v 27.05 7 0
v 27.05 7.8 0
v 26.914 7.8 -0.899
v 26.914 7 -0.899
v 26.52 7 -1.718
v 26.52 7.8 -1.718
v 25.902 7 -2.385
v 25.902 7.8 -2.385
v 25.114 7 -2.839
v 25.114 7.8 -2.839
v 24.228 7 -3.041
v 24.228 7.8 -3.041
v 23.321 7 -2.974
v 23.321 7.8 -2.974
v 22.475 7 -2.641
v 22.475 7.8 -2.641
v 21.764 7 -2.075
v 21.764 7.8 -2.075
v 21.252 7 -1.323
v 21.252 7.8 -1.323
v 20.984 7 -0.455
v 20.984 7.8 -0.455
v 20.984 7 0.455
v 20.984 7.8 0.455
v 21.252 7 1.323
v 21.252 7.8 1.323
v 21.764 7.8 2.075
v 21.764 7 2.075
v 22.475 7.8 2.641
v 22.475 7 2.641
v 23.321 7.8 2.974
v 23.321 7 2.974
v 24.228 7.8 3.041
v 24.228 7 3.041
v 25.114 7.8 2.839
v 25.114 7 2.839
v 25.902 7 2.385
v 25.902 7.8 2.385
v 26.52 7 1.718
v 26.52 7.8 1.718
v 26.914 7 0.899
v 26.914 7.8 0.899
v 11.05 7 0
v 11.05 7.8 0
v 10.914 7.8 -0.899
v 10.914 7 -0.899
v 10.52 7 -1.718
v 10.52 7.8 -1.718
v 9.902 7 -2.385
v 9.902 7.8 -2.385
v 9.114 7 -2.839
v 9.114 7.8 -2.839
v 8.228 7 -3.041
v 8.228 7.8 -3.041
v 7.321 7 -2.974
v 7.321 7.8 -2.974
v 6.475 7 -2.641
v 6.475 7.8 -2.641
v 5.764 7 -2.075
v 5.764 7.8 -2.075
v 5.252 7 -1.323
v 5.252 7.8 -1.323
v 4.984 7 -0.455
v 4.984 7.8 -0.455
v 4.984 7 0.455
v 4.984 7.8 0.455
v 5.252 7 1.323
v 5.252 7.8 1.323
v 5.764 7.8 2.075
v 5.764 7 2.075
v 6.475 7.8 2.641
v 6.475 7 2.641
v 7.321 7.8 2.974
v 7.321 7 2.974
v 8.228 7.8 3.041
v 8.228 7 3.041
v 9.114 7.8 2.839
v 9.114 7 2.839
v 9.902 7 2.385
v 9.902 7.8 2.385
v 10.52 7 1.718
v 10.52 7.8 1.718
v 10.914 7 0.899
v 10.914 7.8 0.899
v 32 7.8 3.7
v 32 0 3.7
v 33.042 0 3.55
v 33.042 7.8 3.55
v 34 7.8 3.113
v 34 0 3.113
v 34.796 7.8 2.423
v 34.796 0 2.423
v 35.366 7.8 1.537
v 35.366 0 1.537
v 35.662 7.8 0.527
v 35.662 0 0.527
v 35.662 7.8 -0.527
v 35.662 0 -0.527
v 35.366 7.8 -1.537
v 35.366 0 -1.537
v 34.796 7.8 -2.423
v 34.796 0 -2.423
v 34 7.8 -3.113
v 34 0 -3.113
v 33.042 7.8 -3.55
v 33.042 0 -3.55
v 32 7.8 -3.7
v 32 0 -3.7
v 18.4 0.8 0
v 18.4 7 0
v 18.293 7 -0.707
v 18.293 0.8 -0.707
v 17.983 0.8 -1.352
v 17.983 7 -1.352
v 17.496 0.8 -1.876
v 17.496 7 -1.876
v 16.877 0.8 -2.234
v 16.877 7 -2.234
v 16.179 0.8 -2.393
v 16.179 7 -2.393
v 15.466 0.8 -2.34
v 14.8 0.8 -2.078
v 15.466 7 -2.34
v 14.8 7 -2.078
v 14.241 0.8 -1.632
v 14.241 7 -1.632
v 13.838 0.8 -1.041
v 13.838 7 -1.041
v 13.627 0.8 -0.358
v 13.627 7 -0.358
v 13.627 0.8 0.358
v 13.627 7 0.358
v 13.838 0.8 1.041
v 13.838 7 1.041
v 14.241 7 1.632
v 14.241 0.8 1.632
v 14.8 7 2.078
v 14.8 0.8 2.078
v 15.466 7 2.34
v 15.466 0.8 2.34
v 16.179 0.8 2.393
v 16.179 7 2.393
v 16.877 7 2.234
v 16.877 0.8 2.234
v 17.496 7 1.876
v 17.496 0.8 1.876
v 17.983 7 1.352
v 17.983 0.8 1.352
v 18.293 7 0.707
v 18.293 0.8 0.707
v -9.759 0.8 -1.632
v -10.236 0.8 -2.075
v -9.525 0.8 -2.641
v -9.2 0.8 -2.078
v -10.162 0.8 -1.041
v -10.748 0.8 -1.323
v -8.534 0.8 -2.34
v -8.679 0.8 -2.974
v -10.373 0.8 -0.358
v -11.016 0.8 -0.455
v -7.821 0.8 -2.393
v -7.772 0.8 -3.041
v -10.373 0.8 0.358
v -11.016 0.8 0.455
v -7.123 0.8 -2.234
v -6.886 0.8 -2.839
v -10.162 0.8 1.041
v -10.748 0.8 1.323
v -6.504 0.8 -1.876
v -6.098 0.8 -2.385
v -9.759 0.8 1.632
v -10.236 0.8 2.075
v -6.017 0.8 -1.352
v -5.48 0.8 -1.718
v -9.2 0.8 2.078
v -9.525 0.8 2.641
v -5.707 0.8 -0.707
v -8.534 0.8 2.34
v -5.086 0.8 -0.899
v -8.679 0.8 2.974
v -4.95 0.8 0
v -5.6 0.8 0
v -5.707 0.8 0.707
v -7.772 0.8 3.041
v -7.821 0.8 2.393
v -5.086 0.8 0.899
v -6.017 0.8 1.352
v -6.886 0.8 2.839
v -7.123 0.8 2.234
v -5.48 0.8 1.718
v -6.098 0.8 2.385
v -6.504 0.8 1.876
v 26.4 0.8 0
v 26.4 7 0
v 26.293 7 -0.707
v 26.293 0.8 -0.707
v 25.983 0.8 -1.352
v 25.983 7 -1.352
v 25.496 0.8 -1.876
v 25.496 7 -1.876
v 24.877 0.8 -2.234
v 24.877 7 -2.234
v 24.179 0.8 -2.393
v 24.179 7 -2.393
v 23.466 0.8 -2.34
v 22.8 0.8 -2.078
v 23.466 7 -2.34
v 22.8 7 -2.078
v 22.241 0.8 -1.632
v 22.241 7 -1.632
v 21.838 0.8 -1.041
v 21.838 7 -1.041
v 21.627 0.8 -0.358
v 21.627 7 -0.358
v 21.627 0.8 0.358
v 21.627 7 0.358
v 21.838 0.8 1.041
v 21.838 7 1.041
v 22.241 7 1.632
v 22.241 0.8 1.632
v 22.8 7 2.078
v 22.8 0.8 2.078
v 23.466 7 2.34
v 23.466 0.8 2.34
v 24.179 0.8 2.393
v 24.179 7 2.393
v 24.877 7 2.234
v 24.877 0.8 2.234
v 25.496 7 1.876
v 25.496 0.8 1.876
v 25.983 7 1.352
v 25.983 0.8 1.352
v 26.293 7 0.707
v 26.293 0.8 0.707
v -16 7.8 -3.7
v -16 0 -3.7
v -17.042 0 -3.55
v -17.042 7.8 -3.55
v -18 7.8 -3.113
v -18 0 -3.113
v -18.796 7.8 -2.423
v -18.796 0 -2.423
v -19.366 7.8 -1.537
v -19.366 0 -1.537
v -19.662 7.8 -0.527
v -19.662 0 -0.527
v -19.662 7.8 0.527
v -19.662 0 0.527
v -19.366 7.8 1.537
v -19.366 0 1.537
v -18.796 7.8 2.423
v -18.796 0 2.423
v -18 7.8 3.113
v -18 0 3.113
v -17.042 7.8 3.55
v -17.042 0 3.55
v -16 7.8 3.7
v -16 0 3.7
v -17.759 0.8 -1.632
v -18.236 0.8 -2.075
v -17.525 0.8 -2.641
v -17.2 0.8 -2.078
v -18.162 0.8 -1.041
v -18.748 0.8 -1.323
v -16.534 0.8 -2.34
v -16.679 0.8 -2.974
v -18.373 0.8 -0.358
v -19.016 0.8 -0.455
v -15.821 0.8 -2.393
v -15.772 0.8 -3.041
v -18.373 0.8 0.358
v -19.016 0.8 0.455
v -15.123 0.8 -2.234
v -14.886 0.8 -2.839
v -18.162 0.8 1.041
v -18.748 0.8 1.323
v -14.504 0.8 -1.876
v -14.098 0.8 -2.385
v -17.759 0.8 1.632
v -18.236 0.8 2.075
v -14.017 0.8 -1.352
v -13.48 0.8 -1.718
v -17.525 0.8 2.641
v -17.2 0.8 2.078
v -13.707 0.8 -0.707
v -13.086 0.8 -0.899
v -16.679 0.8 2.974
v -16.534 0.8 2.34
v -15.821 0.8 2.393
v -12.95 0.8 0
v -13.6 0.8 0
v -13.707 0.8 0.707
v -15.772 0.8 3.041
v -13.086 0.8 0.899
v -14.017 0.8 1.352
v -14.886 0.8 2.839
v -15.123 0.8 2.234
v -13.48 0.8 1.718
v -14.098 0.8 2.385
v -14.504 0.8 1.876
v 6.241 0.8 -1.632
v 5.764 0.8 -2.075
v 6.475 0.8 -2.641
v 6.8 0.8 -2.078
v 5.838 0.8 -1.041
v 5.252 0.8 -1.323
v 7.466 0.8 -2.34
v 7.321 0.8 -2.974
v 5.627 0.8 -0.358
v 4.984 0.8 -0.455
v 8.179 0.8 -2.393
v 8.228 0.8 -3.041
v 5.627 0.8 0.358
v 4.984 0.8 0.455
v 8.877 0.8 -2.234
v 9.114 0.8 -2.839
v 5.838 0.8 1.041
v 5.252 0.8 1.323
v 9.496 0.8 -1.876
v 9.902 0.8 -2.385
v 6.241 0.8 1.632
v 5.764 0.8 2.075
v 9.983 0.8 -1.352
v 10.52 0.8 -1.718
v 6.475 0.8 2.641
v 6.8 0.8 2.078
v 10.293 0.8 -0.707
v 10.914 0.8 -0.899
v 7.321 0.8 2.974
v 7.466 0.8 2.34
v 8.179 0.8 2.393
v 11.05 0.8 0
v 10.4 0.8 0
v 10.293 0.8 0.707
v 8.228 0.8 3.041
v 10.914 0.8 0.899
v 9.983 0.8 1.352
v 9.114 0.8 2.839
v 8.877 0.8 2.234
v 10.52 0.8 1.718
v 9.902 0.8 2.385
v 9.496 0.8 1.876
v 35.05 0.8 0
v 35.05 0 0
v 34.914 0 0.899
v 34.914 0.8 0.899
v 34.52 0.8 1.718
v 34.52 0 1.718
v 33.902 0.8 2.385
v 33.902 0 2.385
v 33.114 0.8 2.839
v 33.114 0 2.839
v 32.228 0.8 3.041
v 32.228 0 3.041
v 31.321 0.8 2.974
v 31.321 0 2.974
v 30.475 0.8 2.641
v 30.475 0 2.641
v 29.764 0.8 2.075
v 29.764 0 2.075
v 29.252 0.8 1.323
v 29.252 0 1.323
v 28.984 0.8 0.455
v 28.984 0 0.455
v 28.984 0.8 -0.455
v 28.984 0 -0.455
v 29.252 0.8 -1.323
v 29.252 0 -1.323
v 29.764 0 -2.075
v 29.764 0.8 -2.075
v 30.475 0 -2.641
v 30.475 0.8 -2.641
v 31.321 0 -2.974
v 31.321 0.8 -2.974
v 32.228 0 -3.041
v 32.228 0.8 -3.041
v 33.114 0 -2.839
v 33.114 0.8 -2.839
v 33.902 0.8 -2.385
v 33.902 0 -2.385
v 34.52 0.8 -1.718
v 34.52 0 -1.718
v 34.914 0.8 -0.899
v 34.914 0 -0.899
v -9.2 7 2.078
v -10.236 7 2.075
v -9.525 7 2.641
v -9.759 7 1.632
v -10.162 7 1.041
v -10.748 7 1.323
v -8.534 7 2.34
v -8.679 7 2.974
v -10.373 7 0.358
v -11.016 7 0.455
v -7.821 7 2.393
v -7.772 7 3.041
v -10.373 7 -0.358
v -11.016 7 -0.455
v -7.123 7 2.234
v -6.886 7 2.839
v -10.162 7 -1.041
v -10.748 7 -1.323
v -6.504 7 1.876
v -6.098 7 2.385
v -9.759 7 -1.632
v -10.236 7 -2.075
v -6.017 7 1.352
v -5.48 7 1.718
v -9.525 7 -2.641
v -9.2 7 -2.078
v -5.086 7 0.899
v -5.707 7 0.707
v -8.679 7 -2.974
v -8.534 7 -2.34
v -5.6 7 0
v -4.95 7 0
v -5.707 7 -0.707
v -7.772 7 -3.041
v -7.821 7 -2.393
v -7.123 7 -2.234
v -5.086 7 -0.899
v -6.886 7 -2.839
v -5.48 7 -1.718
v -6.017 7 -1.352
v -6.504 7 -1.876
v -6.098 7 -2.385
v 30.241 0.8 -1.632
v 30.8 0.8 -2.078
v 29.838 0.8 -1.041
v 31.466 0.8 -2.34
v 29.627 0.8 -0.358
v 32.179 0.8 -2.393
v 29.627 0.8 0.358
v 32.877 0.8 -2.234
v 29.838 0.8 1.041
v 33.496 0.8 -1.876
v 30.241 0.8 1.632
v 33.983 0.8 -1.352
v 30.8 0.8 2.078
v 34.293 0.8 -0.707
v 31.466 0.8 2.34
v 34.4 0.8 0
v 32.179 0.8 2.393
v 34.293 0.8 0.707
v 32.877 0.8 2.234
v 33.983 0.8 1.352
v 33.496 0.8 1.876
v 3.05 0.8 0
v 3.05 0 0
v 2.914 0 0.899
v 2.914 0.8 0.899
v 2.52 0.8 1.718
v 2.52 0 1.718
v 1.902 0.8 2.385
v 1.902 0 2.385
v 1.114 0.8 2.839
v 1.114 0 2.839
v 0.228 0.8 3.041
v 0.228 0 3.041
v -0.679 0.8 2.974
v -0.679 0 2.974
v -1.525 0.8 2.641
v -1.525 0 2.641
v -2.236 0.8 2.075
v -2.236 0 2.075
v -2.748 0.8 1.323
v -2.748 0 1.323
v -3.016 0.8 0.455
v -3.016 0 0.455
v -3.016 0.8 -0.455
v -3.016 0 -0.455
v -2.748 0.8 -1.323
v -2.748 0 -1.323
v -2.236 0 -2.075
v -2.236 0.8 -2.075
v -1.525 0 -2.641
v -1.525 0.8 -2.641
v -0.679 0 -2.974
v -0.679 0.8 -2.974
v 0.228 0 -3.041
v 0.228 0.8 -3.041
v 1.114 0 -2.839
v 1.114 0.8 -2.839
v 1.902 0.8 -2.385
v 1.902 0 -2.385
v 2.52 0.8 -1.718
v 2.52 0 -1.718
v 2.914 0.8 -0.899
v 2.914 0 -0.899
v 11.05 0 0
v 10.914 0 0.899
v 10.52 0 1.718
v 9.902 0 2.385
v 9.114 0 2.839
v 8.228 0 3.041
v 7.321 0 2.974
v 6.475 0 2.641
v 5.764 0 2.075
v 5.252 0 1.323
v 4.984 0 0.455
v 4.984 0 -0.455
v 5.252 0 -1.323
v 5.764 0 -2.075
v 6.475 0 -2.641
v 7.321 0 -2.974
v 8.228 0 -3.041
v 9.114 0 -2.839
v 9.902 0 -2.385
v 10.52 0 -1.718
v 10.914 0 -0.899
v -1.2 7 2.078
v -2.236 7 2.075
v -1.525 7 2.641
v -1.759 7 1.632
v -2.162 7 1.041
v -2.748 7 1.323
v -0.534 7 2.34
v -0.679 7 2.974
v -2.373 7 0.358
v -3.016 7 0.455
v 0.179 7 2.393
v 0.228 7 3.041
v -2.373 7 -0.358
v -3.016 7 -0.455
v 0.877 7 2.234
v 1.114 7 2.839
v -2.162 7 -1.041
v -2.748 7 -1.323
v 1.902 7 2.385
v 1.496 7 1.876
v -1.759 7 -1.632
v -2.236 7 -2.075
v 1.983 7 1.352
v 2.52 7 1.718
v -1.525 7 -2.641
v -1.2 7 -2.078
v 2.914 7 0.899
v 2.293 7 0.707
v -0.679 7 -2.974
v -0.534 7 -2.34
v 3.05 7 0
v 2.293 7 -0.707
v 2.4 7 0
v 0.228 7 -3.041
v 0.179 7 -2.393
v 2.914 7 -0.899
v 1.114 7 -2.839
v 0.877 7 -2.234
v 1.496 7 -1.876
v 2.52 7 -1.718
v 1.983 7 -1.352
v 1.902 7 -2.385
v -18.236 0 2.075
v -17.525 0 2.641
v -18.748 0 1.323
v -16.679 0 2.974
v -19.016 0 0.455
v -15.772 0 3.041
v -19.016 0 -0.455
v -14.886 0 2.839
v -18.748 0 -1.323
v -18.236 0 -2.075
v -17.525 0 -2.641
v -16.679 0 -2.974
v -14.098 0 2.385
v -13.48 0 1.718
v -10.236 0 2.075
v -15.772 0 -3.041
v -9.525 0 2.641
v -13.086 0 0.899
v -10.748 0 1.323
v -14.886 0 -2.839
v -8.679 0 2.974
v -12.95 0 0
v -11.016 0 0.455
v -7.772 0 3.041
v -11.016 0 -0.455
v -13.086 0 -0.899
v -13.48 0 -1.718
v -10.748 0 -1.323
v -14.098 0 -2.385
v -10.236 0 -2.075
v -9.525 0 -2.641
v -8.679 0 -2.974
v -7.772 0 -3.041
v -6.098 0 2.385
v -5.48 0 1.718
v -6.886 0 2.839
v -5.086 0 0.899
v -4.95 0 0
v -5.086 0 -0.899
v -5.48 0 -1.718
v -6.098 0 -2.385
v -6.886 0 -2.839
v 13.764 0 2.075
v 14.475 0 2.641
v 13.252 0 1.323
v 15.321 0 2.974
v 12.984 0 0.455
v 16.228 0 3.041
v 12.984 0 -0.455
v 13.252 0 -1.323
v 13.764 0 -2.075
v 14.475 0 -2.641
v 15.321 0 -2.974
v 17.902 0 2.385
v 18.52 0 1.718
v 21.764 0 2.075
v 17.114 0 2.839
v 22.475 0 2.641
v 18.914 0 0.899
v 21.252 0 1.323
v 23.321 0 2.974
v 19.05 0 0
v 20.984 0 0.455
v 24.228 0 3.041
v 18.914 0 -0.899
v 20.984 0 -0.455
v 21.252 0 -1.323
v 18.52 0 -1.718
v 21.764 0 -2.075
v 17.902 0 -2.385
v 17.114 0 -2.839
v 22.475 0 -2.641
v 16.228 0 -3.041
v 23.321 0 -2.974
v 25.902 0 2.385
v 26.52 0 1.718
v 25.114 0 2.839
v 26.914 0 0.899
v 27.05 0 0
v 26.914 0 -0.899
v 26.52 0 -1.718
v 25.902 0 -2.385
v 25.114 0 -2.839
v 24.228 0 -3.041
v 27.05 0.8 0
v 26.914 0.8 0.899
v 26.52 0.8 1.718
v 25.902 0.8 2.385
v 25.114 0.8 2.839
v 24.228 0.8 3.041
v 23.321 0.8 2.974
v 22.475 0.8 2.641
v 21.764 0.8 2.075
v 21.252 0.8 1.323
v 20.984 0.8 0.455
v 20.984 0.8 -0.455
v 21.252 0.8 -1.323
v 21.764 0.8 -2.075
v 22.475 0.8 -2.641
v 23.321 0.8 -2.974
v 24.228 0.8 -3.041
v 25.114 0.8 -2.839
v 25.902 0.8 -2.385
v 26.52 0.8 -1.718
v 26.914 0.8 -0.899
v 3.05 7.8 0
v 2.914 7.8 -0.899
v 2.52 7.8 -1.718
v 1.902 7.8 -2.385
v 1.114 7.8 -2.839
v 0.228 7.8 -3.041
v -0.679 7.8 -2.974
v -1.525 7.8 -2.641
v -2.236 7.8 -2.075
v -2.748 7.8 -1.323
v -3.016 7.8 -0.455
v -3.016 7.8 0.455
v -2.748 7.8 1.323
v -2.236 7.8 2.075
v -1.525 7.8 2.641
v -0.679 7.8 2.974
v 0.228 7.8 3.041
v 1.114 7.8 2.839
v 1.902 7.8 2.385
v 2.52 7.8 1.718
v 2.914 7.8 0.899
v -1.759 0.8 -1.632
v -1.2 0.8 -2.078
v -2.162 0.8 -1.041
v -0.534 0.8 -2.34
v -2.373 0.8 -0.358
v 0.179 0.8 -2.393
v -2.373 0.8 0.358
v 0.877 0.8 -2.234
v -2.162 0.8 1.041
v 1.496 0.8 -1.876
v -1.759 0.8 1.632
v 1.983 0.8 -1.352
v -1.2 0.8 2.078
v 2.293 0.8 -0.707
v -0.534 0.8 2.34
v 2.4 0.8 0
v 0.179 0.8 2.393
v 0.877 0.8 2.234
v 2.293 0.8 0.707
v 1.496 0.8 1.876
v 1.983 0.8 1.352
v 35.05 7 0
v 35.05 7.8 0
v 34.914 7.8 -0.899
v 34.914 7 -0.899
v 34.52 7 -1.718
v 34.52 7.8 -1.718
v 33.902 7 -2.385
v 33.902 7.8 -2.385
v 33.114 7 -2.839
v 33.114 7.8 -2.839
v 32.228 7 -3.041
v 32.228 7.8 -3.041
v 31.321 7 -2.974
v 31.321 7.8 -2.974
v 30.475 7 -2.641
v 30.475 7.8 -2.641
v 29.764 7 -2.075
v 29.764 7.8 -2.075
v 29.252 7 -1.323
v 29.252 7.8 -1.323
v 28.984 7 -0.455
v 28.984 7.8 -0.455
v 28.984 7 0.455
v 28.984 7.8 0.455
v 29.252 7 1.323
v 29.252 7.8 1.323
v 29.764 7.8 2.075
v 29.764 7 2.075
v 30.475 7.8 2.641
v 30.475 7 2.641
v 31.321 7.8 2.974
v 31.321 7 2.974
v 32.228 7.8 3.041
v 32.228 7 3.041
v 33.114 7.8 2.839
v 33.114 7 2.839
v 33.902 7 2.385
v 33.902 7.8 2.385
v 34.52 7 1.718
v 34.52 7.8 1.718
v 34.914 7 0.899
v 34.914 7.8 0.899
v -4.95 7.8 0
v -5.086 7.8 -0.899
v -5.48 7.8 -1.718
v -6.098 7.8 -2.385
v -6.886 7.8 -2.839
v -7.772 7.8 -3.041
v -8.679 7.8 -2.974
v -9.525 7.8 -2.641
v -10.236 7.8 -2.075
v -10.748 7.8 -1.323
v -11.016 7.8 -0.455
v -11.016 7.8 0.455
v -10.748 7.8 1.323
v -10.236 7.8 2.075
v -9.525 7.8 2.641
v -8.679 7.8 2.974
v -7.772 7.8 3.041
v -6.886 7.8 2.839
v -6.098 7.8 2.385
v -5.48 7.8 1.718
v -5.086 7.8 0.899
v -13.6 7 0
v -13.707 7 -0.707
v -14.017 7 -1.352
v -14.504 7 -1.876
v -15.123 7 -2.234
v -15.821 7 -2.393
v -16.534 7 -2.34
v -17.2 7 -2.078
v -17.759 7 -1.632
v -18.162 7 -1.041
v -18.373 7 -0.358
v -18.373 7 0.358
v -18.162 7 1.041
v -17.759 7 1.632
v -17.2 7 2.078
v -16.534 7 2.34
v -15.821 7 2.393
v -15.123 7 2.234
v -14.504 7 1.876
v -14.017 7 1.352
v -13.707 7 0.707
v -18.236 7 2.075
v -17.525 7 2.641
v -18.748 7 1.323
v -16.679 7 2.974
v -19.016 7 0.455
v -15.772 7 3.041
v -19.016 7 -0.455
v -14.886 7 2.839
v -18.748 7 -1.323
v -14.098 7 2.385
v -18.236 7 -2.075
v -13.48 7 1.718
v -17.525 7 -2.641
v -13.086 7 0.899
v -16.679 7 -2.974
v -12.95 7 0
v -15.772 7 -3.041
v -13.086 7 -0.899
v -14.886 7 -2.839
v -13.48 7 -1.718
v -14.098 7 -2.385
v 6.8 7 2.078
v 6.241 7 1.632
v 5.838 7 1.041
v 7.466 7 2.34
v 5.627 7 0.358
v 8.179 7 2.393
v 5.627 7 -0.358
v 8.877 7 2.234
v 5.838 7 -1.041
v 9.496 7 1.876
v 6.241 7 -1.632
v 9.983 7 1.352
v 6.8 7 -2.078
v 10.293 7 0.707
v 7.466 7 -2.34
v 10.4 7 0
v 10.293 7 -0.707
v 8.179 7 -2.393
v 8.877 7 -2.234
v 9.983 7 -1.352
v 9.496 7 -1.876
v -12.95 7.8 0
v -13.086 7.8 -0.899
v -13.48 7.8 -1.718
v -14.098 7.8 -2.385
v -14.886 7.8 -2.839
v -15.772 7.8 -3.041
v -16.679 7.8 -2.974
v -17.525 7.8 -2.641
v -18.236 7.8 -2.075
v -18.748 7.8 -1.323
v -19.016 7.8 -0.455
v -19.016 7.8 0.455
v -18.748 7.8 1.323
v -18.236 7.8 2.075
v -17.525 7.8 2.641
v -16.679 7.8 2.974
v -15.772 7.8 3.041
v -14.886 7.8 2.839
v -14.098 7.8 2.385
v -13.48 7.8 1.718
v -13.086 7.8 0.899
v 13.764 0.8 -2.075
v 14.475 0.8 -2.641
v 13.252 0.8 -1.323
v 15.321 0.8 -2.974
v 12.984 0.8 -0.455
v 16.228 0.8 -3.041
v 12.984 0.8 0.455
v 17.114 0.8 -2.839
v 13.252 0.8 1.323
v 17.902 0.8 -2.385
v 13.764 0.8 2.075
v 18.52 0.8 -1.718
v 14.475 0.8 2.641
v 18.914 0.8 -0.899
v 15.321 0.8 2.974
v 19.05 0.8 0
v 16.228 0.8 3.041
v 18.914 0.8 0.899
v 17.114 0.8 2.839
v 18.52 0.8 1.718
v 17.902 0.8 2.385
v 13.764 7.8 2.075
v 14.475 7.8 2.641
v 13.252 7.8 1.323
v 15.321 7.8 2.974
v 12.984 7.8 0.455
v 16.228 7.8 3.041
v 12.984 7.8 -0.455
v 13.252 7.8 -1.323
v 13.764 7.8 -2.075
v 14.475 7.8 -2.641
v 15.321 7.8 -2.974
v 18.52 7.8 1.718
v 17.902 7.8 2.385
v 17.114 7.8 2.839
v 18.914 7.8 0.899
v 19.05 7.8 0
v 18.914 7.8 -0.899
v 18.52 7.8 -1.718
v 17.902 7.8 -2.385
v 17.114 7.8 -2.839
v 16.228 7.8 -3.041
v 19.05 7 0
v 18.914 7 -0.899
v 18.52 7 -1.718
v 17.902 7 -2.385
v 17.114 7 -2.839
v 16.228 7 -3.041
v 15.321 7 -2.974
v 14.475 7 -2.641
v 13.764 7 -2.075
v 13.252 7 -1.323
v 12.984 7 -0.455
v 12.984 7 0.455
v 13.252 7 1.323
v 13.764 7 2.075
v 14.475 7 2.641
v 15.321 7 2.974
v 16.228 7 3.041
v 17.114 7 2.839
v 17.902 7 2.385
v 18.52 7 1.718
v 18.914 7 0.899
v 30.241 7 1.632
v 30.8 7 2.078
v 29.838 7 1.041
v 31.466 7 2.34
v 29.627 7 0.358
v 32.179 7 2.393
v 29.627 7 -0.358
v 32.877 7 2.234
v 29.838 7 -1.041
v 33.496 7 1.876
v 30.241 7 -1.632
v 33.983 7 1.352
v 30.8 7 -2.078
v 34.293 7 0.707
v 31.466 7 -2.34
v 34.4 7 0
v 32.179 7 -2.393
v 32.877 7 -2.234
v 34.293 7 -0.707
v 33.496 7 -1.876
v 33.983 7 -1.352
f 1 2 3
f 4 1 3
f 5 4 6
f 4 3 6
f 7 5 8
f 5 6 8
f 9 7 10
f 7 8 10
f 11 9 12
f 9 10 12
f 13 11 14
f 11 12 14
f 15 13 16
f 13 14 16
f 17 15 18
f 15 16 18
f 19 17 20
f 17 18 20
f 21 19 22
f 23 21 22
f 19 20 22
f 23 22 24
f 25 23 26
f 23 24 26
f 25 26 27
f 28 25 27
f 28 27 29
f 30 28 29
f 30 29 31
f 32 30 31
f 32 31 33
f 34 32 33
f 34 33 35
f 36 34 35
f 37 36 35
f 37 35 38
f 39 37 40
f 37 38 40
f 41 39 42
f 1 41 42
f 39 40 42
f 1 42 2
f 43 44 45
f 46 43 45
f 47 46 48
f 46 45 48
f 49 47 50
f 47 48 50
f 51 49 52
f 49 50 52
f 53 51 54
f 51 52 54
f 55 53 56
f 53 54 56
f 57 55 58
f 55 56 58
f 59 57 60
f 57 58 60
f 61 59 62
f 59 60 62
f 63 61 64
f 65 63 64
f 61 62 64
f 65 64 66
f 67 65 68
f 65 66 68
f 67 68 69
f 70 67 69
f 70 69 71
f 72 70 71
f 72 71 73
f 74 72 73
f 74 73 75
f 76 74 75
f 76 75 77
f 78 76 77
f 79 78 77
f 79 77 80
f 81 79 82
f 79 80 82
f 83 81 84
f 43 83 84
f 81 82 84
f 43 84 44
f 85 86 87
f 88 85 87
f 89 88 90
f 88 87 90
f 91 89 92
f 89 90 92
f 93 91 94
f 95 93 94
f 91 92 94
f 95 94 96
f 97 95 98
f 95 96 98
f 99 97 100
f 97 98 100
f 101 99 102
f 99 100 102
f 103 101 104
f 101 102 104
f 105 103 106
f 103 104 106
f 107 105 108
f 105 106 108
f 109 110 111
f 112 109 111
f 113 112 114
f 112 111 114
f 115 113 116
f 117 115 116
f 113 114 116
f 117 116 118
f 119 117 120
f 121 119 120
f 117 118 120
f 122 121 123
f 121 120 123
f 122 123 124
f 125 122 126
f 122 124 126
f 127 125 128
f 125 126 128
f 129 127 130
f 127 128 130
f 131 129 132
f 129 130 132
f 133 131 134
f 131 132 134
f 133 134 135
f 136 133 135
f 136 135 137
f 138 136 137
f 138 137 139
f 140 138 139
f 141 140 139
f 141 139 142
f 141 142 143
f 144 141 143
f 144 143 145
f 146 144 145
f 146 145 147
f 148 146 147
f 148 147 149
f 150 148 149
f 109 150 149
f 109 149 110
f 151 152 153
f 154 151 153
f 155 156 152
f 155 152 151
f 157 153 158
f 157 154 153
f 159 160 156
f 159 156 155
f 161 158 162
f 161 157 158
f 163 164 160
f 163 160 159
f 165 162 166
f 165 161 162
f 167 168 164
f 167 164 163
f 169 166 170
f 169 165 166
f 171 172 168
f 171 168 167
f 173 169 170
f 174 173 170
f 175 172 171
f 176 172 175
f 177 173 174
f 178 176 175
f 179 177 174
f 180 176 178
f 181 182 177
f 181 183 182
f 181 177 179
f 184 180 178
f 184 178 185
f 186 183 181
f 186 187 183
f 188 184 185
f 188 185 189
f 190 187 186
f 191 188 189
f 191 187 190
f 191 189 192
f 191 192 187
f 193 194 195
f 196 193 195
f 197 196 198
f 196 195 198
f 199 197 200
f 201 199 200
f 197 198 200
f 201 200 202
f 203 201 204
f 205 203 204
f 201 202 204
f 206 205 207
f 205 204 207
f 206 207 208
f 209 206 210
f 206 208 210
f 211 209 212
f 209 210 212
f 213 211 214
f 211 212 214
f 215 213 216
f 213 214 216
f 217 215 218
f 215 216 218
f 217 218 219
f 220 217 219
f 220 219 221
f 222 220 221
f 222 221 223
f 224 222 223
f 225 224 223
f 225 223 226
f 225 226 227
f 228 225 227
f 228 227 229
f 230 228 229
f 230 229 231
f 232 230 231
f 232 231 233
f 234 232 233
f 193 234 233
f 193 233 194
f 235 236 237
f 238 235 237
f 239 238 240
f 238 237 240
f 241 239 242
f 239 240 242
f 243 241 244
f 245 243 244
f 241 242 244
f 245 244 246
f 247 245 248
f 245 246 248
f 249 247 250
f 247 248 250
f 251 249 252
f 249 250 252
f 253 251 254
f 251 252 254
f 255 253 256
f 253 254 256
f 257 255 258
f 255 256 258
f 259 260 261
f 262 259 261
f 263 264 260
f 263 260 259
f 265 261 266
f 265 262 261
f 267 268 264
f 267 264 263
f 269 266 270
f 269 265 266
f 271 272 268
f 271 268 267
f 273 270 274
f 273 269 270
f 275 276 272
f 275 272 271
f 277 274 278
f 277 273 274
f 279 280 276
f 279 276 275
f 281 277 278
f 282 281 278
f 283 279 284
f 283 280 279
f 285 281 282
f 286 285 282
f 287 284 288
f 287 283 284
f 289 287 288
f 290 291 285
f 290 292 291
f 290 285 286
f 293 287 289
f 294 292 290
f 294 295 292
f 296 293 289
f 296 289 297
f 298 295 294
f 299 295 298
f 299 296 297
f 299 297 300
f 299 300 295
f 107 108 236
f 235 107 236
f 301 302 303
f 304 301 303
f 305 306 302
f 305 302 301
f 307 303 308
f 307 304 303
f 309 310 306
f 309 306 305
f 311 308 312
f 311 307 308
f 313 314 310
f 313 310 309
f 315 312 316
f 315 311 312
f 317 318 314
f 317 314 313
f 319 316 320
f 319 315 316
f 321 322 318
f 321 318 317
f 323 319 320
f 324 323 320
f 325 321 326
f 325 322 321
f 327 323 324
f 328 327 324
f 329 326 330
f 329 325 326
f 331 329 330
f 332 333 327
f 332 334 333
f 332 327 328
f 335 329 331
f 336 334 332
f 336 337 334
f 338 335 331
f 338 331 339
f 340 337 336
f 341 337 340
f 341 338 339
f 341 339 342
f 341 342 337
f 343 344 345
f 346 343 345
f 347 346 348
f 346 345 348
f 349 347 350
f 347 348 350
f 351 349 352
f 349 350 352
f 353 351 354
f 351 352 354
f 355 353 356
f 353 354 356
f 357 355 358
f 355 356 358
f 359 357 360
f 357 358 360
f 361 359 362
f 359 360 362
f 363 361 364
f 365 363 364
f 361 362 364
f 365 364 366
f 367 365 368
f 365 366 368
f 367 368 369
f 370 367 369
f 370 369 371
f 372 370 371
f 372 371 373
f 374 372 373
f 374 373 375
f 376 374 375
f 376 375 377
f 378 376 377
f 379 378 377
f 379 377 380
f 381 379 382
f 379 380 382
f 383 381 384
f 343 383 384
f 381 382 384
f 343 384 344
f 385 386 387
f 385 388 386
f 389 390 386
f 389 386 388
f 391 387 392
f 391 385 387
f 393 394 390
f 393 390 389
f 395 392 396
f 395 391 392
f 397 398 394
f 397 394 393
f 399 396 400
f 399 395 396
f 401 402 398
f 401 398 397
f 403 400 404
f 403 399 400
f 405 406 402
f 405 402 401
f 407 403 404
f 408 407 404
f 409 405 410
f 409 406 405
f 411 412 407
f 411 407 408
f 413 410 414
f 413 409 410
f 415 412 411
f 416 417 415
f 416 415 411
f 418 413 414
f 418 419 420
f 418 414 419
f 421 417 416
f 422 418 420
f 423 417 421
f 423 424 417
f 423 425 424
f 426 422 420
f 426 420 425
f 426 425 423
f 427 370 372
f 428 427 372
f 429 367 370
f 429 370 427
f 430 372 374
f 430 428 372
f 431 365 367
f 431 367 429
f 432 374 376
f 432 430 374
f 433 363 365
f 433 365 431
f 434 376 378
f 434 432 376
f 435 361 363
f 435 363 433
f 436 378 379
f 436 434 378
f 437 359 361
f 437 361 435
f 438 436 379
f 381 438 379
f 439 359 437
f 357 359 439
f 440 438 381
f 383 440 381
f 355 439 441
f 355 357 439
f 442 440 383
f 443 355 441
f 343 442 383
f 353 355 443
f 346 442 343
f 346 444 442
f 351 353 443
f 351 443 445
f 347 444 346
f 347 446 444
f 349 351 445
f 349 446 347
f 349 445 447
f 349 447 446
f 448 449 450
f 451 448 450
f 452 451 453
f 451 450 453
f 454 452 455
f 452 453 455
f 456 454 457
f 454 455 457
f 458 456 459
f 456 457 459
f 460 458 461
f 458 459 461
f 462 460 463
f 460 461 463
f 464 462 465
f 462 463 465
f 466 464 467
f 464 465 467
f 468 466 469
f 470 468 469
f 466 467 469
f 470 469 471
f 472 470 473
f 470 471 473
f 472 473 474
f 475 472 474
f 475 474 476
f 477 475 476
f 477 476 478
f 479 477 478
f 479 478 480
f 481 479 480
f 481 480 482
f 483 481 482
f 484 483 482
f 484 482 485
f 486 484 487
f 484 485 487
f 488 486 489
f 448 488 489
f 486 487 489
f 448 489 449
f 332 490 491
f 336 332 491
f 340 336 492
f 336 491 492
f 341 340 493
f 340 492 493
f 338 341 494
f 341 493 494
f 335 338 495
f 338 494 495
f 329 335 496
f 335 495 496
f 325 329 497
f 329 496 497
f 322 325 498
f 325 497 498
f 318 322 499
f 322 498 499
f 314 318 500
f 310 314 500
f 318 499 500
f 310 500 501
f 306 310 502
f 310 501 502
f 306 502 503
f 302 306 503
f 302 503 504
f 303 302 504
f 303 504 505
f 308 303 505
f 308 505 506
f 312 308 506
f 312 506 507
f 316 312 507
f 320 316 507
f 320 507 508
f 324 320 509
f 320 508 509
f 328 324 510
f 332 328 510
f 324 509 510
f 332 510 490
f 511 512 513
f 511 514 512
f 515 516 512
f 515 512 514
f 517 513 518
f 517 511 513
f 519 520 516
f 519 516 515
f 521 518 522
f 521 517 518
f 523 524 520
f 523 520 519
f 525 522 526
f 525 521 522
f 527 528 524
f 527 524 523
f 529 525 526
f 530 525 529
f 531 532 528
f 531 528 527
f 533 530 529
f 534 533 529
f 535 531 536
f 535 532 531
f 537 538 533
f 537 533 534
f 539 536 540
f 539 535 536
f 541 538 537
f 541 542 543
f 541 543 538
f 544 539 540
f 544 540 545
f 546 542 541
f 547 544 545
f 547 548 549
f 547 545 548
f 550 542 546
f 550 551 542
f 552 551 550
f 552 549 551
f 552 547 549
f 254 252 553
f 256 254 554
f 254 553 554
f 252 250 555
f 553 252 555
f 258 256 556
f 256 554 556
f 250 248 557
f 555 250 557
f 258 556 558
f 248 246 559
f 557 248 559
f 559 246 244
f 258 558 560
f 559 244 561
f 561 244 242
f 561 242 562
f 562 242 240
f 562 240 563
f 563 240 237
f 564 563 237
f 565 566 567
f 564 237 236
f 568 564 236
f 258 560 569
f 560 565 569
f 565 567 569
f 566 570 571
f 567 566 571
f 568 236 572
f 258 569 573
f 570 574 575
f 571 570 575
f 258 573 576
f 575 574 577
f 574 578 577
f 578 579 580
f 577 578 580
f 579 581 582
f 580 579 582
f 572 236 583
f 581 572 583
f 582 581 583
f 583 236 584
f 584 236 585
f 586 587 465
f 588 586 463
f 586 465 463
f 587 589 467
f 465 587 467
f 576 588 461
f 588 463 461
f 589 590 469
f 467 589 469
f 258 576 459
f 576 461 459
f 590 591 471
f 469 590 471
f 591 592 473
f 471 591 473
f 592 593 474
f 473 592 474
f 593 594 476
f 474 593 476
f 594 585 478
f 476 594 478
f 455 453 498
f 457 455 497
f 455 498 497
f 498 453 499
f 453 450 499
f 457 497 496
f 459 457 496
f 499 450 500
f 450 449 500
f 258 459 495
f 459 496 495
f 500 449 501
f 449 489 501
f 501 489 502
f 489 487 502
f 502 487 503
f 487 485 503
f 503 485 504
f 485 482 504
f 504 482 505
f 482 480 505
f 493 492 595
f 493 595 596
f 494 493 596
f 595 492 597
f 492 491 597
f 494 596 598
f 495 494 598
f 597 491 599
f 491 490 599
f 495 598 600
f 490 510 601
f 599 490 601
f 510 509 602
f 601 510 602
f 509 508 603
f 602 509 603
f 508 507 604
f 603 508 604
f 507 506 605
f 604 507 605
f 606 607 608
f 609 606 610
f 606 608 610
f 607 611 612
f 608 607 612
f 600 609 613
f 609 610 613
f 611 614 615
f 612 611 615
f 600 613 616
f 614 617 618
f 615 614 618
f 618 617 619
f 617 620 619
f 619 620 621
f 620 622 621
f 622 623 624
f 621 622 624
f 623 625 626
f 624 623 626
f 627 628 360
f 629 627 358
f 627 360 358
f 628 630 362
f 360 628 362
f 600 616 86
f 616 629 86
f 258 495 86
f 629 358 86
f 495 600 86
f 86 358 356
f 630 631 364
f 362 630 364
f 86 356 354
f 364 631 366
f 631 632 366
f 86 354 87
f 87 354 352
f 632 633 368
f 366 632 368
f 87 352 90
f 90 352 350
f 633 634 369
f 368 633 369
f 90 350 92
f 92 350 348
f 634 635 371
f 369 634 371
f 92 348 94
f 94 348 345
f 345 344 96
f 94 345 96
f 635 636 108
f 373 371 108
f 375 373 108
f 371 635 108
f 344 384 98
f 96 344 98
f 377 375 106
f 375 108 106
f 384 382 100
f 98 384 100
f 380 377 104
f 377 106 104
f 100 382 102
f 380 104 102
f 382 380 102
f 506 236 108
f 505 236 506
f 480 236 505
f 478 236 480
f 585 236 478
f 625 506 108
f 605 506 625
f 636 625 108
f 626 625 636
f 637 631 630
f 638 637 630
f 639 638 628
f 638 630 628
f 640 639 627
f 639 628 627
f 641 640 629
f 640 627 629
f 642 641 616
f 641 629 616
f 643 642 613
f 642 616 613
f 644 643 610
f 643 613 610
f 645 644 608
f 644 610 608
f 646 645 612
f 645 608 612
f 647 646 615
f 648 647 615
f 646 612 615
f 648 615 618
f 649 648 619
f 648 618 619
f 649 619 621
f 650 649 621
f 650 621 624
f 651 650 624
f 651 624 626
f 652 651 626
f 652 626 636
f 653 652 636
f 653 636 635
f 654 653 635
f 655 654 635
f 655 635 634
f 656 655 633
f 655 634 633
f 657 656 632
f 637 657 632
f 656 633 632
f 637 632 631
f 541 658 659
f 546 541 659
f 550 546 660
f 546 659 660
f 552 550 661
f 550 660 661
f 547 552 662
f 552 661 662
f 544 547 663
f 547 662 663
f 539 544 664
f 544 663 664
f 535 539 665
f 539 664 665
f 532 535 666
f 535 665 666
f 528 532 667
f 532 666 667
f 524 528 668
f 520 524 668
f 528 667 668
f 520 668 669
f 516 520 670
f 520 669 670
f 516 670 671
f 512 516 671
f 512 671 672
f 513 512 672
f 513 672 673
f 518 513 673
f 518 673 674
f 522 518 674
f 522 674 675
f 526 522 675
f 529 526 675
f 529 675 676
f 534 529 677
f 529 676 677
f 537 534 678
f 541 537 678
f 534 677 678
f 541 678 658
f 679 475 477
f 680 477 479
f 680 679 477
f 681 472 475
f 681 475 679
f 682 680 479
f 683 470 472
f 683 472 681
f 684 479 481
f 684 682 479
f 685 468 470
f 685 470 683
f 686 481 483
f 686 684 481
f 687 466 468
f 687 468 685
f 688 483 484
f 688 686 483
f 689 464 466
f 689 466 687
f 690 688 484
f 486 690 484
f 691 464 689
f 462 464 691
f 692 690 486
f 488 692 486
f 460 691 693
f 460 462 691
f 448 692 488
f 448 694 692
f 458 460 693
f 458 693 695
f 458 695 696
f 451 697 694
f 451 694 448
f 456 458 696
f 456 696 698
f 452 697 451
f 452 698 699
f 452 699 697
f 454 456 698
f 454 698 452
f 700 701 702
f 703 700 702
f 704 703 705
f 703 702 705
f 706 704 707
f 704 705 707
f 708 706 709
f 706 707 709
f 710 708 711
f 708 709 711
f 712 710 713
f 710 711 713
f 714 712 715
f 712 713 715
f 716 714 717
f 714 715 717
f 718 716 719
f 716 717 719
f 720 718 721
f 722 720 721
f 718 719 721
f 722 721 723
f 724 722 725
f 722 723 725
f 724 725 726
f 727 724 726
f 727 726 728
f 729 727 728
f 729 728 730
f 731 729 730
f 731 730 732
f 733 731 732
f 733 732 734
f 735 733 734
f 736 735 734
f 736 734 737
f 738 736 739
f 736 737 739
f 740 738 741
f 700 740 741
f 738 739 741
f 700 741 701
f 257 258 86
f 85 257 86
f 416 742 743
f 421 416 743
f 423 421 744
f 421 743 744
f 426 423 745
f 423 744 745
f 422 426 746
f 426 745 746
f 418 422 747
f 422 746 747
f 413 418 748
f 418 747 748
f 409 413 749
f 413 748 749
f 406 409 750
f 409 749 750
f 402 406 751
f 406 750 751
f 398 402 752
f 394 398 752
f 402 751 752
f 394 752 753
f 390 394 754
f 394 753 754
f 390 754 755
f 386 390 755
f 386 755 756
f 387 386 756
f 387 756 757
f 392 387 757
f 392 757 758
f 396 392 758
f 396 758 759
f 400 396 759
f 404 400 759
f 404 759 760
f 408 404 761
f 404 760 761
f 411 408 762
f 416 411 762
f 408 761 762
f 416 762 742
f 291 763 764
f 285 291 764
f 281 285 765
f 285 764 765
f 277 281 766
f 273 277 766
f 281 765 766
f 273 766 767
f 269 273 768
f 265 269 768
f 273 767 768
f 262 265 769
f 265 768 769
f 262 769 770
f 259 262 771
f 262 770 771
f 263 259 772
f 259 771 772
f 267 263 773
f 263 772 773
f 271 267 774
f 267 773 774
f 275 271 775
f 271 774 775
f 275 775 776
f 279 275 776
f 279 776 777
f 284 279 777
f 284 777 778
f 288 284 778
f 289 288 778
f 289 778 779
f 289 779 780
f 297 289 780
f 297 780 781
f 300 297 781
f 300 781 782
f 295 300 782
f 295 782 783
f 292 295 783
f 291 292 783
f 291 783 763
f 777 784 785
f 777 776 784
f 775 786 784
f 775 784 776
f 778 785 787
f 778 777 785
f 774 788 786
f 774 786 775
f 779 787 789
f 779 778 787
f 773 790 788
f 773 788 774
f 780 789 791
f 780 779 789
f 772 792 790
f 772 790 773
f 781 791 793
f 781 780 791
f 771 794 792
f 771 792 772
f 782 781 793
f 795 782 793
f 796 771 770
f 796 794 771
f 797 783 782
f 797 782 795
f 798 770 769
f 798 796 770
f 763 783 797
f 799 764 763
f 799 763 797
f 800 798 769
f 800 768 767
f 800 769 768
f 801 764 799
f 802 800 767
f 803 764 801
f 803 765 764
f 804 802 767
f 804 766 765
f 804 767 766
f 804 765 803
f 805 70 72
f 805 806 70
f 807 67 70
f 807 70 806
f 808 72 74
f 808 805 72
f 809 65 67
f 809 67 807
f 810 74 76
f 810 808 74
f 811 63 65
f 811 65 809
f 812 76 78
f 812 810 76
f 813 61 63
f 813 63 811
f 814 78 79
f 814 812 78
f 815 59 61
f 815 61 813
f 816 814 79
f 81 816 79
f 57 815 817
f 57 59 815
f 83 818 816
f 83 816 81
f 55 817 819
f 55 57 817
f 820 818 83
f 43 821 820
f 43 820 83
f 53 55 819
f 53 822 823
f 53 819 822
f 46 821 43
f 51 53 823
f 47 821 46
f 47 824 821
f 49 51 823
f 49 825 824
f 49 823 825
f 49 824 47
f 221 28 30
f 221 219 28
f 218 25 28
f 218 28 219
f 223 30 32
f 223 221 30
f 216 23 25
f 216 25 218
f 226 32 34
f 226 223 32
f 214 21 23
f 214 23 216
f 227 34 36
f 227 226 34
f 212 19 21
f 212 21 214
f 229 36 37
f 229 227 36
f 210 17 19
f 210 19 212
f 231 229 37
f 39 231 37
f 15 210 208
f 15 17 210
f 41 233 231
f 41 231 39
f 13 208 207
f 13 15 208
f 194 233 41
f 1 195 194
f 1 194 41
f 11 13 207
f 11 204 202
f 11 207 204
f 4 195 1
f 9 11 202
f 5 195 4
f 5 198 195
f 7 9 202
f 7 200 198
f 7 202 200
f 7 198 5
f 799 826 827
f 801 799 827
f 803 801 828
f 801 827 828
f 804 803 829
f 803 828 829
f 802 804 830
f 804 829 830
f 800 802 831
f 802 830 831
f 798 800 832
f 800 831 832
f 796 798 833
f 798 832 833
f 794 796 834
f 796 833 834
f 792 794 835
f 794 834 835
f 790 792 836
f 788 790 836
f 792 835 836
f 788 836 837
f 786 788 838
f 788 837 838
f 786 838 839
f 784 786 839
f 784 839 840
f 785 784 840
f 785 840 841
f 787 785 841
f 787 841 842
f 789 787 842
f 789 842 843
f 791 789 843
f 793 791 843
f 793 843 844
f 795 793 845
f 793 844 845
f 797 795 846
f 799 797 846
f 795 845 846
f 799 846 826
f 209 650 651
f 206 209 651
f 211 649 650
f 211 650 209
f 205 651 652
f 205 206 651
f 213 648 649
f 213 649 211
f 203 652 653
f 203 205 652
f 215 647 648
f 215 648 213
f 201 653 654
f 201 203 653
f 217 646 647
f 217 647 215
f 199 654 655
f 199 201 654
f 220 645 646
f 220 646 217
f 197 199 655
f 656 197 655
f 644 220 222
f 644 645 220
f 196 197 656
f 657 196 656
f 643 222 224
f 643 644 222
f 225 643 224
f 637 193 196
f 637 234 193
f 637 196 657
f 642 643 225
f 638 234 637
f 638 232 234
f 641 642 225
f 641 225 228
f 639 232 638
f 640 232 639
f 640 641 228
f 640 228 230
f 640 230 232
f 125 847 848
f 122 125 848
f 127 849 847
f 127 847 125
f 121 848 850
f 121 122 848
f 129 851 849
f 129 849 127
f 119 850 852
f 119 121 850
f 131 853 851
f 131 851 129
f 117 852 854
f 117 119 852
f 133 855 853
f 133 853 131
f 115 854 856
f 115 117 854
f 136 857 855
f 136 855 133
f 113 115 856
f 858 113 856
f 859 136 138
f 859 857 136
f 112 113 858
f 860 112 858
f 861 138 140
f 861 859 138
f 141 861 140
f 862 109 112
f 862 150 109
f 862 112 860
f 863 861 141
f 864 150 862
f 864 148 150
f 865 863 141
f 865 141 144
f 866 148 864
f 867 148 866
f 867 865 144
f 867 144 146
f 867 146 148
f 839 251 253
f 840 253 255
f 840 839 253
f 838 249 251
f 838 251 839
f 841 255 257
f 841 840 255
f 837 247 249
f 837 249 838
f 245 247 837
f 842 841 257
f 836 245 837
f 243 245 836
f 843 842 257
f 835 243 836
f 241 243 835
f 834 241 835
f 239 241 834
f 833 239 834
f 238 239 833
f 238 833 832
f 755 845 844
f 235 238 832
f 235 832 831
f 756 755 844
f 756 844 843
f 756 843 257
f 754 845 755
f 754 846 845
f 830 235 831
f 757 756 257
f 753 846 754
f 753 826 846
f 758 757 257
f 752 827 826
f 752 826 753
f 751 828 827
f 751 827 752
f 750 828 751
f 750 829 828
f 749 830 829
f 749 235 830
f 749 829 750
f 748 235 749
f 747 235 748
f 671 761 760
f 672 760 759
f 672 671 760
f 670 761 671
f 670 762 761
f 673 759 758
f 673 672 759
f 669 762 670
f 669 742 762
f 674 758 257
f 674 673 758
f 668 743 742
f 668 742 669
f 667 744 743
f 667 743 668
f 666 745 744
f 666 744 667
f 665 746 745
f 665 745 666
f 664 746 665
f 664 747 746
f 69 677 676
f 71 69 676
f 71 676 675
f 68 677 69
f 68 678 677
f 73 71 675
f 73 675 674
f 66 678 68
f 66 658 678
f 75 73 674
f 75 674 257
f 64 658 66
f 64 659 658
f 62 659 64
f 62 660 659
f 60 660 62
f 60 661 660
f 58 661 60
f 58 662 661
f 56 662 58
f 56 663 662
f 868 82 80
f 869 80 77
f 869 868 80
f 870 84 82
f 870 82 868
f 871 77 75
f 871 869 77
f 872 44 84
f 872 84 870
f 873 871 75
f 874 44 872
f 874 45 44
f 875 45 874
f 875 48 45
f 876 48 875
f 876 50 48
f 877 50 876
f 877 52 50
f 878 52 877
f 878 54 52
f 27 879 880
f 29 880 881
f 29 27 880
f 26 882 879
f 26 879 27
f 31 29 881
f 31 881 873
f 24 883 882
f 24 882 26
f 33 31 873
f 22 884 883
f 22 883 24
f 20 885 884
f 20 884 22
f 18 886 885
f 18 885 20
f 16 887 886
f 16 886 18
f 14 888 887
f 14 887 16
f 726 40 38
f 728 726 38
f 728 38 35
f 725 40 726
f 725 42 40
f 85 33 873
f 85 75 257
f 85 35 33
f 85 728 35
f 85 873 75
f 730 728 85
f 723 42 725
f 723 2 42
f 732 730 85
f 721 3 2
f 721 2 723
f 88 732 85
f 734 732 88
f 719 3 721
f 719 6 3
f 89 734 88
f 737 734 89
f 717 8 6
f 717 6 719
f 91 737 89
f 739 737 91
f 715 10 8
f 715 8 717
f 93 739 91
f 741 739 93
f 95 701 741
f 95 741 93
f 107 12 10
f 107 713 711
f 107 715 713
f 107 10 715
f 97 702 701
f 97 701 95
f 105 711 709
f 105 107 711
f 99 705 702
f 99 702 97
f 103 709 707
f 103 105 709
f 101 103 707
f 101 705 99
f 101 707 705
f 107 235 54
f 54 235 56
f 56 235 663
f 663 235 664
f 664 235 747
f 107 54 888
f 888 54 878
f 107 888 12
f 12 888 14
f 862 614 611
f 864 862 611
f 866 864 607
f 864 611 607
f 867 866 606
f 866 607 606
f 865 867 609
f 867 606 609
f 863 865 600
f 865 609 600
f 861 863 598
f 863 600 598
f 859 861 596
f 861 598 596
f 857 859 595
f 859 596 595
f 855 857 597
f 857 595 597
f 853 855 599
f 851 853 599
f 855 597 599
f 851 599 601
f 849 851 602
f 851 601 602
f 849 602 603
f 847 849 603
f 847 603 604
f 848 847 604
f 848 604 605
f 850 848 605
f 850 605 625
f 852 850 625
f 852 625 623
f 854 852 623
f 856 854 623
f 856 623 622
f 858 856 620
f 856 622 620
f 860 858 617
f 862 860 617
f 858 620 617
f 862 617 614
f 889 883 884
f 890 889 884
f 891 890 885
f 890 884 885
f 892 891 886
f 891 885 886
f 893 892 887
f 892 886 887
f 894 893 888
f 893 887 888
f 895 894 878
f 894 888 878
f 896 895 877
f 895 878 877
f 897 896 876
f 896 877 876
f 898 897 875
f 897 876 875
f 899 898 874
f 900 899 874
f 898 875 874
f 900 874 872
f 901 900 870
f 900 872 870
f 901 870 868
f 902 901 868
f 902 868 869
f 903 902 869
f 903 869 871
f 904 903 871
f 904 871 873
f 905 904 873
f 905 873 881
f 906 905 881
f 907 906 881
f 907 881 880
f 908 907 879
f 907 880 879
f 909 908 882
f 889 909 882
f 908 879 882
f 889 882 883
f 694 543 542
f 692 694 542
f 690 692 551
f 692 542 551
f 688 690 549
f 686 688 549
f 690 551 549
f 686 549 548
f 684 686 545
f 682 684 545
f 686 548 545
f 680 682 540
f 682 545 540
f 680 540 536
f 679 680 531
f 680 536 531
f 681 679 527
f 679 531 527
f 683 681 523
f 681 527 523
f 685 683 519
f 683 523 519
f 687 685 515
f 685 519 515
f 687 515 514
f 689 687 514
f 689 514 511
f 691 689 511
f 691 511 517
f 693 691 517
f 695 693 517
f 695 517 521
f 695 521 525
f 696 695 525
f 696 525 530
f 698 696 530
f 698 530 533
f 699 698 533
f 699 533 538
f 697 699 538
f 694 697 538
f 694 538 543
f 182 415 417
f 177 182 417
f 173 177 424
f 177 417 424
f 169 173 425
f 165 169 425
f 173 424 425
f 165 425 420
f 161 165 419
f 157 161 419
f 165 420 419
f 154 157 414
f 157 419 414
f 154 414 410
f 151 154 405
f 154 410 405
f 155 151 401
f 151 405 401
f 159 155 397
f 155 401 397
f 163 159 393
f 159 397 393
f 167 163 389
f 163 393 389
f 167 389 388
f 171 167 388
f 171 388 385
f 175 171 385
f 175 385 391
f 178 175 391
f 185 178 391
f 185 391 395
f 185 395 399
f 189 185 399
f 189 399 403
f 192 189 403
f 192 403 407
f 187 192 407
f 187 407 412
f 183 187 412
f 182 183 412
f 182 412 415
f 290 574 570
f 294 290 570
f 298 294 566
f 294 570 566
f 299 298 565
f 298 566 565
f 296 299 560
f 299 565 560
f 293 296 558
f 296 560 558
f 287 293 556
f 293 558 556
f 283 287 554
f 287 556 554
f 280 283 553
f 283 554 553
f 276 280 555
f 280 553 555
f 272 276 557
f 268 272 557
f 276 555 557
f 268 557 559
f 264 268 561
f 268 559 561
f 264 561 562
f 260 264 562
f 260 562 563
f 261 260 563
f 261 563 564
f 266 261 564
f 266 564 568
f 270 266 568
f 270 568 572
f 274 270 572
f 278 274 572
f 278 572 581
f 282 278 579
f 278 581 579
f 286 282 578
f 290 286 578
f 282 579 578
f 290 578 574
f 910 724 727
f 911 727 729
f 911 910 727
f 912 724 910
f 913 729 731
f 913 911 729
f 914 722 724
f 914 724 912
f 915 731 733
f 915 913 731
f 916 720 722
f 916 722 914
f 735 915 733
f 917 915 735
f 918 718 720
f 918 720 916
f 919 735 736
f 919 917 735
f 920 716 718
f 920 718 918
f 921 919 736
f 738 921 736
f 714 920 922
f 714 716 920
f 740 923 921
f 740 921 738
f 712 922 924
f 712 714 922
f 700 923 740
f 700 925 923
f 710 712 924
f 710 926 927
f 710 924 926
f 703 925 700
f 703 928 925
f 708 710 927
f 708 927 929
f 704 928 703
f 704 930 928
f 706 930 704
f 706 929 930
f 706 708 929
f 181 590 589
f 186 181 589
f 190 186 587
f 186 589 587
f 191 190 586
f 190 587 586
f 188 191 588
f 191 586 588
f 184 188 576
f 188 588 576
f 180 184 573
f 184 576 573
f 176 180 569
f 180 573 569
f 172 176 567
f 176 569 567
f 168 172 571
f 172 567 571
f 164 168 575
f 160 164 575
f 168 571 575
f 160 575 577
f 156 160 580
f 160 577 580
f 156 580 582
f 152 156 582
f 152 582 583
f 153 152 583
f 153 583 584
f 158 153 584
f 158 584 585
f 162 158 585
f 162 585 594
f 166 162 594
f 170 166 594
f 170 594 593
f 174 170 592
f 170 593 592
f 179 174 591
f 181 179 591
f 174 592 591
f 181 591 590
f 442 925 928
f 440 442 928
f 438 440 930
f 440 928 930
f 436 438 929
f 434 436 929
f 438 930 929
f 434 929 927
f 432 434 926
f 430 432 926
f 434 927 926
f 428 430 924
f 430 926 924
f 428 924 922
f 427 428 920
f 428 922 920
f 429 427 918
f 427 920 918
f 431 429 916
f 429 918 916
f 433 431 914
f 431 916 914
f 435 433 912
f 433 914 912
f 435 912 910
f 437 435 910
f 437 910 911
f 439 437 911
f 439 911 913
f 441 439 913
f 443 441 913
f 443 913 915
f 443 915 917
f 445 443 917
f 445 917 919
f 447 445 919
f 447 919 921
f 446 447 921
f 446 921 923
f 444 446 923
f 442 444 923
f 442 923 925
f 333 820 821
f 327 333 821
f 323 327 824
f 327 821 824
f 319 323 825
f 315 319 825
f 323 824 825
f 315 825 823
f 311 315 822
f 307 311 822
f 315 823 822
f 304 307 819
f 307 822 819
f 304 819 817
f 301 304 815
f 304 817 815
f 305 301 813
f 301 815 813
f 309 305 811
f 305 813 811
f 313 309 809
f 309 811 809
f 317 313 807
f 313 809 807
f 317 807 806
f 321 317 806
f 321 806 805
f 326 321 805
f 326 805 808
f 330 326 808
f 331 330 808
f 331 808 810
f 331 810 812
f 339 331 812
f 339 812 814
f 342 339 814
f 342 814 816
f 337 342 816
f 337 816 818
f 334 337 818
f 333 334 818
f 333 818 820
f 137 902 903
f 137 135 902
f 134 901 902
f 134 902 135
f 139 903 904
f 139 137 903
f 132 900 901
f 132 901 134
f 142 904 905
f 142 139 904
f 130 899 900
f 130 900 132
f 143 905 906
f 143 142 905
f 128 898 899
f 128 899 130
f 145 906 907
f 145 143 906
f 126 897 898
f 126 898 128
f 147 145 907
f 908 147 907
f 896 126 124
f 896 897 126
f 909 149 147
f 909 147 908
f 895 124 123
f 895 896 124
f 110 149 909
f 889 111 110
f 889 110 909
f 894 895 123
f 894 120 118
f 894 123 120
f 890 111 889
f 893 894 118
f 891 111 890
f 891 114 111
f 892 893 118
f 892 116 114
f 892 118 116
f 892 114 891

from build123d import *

# Parameters (mm, degrees)
BOSS_EXTRUDE3_DEPTH = 7.8
SKETCH2_R           = 2.4
CUT_EXTRUDE1_DEPTH  = 7.8
SKETCH3_R           = 3.05
CUT_EXTRUDE2_DEPTH  = 0.8
SKETCH4_R           = 3.05
CUT_EXTRUDE3_DEPTH  = 0.8


with BuildPart() as part:
    # Sketch1 → Boss-Extrude3 (new body)
    with BuildSketch(Plane(origin=(0, 0, 0), x_dir=(1, 0, 0), z_dir=(0, 1, 0))):
        with BuildLine():
            Line((-16, -3.7), (32, -3.7))
            ThreePointArc((32, -3.7), (35.7, 0), (32, 3.7))
            Line((32, 3.7), (-16, 3.7))
            ThreePointArc((-16, 3.7), (-19.7, 0), (-16, -3.7))
        make_face()
    extrude(amount=BOSS_EXTRUDE3_DEPTH)

    # Sketch2 → Cut-Extrude1 (cut)
    with BuildSketch(Plane(origin=(0, 7.8, 0), x_dir=(1, 0, 0), z_dir=(0, 1, 0))):
        Circle(SKETCH2_R)
        with Locations((8, 0)):
            Circle(SKETCH2_R)
        with Locations((16, 0)):
            Circle(SKETCH2_R)
        with Locations((-16, 0)):
            Circle(SKETCH2_R)
        with Locations((-8, 0)):
            Circle(SKETCH2_R)
        with Locations((24, 0)):
            Circle(SKETCH2_R)
        with Locations((32, 0)):
            Circle(SKETCH2_R)
    extrude(amount=-CUT_EXTRUDE1_DEPTH, mode=Mode.SUBTRACT)

    # Sketch3 → Cut-Extrude2 (cut)
    with BuildSketch(Plane(origin=(0, 7.8, 0), x_dir=(1, 0, 0), z_dir=(0, 1, 0))):
        Circle(SKETCH3_R)
        with Locations((8, 0)):
            Circle(SKETCH3_R)
        with Locations((16, 0)):
            Circle(SKETCH3_R)
        with Locations((-16, 0)):
            Circle(SKETCH3_R)
        with Locations((-8, 0)):
            Circle(SKETCH3_R)
        with Locations((32, 0)):
            Circle(SKETCH3_R)
        with Locations((24, 0)):
            Circle(SKETCH3_R)
    extrude(amount=-CUT_EXTRUDE2_DEPTH, mode=Mode.SUBTRACT)

    # Sketch4 → Cut-Extrude3 (cut)
    with BuildSketch(Plane.XZ):
        Circle(SKETCH4_R)
        with Locations((8, 0)):
            Circle(SKETCH4_R)
        with Locations((16, 0)):
            Circle(SKETCH4_R)
        with Locations((-16, 0)):
            Circle(SKETCH4_R)
        with Locations((-8, 0)):
            Circle(SKETCH4_R)
        with Locations((32, 0)):
            Circle(SKETCH4_R)
        with Locations((24, 0)):
            Circle(SKETCH4_R)
    extrude(amount=-CUT_EXTRUDE3_DEPTH, mode=Mode.SUBTRACT)


solid = part.part
